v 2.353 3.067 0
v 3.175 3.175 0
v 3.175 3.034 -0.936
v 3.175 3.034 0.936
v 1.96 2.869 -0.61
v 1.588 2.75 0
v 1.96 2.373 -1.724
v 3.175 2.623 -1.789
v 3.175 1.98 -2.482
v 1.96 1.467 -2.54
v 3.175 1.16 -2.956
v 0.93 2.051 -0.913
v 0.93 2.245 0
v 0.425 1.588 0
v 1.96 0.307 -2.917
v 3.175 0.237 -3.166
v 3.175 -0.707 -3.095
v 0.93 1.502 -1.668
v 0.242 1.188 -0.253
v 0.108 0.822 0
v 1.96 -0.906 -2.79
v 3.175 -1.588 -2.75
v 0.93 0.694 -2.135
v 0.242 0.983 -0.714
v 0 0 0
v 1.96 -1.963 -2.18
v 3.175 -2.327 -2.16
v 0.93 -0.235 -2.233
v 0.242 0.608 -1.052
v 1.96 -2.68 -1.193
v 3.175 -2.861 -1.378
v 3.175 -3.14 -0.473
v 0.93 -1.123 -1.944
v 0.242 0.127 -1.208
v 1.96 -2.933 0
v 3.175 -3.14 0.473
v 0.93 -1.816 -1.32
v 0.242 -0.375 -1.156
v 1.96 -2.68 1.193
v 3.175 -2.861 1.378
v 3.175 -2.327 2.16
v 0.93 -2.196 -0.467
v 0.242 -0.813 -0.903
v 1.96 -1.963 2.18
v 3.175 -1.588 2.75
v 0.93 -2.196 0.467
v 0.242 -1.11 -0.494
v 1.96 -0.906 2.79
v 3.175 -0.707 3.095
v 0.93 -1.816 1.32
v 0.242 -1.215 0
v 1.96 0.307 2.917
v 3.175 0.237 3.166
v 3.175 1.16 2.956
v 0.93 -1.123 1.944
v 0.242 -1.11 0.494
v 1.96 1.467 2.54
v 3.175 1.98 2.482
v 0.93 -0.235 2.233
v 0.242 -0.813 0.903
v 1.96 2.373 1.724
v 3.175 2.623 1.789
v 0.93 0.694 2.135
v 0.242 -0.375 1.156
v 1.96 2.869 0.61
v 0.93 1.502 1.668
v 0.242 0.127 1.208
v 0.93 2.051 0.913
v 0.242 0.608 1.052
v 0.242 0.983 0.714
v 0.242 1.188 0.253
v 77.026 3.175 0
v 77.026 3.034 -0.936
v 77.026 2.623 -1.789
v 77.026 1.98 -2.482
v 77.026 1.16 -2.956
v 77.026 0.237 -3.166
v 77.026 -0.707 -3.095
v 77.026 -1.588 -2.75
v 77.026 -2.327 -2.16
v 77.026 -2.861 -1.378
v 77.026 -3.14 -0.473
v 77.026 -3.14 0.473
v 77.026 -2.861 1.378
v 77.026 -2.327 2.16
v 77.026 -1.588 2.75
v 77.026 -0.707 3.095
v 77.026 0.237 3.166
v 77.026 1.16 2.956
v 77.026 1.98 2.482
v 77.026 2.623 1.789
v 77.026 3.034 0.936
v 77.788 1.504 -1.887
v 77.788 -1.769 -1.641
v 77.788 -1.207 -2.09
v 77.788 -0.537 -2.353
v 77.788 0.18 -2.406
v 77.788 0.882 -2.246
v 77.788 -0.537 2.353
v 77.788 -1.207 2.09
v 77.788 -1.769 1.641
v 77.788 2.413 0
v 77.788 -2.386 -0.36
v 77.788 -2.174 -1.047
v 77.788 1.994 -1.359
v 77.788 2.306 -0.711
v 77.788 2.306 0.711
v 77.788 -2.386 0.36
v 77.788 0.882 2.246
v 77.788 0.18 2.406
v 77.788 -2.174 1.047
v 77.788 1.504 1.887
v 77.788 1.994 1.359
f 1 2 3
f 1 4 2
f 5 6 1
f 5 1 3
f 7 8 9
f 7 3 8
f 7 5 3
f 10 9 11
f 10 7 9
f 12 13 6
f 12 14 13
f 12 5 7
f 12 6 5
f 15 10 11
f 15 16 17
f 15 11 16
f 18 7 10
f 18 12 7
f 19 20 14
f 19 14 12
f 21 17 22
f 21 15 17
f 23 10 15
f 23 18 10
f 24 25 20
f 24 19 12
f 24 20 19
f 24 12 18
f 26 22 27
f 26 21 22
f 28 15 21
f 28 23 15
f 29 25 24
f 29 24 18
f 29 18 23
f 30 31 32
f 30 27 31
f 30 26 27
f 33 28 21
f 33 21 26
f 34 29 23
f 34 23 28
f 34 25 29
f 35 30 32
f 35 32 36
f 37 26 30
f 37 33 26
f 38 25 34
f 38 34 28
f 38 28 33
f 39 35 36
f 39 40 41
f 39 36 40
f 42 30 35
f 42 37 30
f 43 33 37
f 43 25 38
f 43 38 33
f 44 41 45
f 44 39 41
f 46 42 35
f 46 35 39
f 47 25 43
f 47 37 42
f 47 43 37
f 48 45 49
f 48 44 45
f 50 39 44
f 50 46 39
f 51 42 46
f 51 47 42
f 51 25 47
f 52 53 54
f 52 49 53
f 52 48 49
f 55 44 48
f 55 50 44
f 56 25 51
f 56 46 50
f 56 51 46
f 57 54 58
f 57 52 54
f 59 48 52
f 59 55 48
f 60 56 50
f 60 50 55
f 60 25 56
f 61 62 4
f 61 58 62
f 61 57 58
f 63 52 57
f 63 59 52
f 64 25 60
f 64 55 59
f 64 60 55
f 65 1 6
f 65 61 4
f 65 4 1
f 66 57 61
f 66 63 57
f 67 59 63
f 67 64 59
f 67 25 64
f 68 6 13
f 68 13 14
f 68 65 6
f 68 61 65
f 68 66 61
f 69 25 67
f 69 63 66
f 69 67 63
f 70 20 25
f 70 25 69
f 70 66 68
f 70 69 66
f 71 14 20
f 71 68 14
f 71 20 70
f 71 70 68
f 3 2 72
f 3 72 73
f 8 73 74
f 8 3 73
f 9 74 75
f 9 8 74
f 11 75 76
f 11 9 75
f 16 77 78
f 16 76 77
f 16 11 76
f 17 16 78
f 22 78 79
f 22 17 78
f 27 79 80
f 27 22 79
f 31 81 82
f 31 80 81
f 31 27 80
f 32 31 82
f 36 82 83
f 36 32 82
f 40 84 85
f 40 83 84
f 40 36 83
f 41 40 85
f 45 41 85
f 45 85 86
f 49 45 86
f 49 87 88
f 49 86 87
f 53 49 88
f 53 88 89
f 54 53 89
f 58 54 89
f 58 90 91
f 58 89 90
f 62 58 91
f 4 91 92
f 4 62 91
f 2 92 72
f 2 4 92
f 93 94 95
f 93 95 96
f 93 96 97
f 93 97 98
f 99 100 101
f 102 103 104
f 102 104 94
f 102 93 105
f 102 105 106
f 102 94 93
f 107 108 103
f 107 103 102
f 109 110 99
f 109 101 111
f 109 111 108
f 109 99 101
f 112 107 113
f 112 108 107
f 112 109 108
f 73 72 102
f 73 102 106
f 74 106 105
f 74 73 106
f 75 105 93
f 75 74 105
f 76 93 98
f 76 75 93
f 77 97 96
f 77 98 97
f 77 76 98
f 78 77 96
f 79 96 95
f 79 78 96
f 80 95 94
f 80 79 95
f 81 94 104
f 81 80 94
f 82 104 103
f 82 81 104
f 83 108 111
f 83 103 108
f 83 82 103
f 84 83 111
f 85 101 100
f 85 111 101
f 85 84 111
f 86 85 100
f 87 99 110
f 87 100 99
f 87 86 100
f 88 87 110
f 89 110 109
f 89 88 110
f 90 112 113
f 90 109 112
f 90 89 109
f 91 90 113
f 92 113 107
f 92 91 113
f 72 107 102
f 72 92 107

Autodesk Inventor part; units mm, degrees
ref_plane "YZ Plane" through (0, 0, 0) normal (1, 0, 0) x (0, 1, 0)
ref_plane "XZ Plane" through (0, 0, 0) normal (0, 1, 0) x (-1, 0, 0)
ref_plane "XY Plane" through (0, 0, 0) normal (0, 0, 1) x (1, 0, 0)
sketch "Sketch1" plane through (0, 0, 0) normal (1, 0, 0) x (0, 1, 0)
  circle A0 centre (0, 0) radius 3.175
  dimension "d0" = 6.35
extrude "Extrusion1" add sketch "Sketch1" along normal blind 77.7875
fillet "Fillet1" radius 3.175 1 edges at (0, -3.175, 0)
chamfer "Chamfer1" distance 0.762 angle 45 1 edges at (77.7875, -3.175, 0) measured on face at (77.7875, -0.5202, -0.7796)
thread "Thread1" size "1/4-20 UNC" class "2A" standard "ANSI Unified Screw Threads" length 15.24
properties part number "lever arm"
